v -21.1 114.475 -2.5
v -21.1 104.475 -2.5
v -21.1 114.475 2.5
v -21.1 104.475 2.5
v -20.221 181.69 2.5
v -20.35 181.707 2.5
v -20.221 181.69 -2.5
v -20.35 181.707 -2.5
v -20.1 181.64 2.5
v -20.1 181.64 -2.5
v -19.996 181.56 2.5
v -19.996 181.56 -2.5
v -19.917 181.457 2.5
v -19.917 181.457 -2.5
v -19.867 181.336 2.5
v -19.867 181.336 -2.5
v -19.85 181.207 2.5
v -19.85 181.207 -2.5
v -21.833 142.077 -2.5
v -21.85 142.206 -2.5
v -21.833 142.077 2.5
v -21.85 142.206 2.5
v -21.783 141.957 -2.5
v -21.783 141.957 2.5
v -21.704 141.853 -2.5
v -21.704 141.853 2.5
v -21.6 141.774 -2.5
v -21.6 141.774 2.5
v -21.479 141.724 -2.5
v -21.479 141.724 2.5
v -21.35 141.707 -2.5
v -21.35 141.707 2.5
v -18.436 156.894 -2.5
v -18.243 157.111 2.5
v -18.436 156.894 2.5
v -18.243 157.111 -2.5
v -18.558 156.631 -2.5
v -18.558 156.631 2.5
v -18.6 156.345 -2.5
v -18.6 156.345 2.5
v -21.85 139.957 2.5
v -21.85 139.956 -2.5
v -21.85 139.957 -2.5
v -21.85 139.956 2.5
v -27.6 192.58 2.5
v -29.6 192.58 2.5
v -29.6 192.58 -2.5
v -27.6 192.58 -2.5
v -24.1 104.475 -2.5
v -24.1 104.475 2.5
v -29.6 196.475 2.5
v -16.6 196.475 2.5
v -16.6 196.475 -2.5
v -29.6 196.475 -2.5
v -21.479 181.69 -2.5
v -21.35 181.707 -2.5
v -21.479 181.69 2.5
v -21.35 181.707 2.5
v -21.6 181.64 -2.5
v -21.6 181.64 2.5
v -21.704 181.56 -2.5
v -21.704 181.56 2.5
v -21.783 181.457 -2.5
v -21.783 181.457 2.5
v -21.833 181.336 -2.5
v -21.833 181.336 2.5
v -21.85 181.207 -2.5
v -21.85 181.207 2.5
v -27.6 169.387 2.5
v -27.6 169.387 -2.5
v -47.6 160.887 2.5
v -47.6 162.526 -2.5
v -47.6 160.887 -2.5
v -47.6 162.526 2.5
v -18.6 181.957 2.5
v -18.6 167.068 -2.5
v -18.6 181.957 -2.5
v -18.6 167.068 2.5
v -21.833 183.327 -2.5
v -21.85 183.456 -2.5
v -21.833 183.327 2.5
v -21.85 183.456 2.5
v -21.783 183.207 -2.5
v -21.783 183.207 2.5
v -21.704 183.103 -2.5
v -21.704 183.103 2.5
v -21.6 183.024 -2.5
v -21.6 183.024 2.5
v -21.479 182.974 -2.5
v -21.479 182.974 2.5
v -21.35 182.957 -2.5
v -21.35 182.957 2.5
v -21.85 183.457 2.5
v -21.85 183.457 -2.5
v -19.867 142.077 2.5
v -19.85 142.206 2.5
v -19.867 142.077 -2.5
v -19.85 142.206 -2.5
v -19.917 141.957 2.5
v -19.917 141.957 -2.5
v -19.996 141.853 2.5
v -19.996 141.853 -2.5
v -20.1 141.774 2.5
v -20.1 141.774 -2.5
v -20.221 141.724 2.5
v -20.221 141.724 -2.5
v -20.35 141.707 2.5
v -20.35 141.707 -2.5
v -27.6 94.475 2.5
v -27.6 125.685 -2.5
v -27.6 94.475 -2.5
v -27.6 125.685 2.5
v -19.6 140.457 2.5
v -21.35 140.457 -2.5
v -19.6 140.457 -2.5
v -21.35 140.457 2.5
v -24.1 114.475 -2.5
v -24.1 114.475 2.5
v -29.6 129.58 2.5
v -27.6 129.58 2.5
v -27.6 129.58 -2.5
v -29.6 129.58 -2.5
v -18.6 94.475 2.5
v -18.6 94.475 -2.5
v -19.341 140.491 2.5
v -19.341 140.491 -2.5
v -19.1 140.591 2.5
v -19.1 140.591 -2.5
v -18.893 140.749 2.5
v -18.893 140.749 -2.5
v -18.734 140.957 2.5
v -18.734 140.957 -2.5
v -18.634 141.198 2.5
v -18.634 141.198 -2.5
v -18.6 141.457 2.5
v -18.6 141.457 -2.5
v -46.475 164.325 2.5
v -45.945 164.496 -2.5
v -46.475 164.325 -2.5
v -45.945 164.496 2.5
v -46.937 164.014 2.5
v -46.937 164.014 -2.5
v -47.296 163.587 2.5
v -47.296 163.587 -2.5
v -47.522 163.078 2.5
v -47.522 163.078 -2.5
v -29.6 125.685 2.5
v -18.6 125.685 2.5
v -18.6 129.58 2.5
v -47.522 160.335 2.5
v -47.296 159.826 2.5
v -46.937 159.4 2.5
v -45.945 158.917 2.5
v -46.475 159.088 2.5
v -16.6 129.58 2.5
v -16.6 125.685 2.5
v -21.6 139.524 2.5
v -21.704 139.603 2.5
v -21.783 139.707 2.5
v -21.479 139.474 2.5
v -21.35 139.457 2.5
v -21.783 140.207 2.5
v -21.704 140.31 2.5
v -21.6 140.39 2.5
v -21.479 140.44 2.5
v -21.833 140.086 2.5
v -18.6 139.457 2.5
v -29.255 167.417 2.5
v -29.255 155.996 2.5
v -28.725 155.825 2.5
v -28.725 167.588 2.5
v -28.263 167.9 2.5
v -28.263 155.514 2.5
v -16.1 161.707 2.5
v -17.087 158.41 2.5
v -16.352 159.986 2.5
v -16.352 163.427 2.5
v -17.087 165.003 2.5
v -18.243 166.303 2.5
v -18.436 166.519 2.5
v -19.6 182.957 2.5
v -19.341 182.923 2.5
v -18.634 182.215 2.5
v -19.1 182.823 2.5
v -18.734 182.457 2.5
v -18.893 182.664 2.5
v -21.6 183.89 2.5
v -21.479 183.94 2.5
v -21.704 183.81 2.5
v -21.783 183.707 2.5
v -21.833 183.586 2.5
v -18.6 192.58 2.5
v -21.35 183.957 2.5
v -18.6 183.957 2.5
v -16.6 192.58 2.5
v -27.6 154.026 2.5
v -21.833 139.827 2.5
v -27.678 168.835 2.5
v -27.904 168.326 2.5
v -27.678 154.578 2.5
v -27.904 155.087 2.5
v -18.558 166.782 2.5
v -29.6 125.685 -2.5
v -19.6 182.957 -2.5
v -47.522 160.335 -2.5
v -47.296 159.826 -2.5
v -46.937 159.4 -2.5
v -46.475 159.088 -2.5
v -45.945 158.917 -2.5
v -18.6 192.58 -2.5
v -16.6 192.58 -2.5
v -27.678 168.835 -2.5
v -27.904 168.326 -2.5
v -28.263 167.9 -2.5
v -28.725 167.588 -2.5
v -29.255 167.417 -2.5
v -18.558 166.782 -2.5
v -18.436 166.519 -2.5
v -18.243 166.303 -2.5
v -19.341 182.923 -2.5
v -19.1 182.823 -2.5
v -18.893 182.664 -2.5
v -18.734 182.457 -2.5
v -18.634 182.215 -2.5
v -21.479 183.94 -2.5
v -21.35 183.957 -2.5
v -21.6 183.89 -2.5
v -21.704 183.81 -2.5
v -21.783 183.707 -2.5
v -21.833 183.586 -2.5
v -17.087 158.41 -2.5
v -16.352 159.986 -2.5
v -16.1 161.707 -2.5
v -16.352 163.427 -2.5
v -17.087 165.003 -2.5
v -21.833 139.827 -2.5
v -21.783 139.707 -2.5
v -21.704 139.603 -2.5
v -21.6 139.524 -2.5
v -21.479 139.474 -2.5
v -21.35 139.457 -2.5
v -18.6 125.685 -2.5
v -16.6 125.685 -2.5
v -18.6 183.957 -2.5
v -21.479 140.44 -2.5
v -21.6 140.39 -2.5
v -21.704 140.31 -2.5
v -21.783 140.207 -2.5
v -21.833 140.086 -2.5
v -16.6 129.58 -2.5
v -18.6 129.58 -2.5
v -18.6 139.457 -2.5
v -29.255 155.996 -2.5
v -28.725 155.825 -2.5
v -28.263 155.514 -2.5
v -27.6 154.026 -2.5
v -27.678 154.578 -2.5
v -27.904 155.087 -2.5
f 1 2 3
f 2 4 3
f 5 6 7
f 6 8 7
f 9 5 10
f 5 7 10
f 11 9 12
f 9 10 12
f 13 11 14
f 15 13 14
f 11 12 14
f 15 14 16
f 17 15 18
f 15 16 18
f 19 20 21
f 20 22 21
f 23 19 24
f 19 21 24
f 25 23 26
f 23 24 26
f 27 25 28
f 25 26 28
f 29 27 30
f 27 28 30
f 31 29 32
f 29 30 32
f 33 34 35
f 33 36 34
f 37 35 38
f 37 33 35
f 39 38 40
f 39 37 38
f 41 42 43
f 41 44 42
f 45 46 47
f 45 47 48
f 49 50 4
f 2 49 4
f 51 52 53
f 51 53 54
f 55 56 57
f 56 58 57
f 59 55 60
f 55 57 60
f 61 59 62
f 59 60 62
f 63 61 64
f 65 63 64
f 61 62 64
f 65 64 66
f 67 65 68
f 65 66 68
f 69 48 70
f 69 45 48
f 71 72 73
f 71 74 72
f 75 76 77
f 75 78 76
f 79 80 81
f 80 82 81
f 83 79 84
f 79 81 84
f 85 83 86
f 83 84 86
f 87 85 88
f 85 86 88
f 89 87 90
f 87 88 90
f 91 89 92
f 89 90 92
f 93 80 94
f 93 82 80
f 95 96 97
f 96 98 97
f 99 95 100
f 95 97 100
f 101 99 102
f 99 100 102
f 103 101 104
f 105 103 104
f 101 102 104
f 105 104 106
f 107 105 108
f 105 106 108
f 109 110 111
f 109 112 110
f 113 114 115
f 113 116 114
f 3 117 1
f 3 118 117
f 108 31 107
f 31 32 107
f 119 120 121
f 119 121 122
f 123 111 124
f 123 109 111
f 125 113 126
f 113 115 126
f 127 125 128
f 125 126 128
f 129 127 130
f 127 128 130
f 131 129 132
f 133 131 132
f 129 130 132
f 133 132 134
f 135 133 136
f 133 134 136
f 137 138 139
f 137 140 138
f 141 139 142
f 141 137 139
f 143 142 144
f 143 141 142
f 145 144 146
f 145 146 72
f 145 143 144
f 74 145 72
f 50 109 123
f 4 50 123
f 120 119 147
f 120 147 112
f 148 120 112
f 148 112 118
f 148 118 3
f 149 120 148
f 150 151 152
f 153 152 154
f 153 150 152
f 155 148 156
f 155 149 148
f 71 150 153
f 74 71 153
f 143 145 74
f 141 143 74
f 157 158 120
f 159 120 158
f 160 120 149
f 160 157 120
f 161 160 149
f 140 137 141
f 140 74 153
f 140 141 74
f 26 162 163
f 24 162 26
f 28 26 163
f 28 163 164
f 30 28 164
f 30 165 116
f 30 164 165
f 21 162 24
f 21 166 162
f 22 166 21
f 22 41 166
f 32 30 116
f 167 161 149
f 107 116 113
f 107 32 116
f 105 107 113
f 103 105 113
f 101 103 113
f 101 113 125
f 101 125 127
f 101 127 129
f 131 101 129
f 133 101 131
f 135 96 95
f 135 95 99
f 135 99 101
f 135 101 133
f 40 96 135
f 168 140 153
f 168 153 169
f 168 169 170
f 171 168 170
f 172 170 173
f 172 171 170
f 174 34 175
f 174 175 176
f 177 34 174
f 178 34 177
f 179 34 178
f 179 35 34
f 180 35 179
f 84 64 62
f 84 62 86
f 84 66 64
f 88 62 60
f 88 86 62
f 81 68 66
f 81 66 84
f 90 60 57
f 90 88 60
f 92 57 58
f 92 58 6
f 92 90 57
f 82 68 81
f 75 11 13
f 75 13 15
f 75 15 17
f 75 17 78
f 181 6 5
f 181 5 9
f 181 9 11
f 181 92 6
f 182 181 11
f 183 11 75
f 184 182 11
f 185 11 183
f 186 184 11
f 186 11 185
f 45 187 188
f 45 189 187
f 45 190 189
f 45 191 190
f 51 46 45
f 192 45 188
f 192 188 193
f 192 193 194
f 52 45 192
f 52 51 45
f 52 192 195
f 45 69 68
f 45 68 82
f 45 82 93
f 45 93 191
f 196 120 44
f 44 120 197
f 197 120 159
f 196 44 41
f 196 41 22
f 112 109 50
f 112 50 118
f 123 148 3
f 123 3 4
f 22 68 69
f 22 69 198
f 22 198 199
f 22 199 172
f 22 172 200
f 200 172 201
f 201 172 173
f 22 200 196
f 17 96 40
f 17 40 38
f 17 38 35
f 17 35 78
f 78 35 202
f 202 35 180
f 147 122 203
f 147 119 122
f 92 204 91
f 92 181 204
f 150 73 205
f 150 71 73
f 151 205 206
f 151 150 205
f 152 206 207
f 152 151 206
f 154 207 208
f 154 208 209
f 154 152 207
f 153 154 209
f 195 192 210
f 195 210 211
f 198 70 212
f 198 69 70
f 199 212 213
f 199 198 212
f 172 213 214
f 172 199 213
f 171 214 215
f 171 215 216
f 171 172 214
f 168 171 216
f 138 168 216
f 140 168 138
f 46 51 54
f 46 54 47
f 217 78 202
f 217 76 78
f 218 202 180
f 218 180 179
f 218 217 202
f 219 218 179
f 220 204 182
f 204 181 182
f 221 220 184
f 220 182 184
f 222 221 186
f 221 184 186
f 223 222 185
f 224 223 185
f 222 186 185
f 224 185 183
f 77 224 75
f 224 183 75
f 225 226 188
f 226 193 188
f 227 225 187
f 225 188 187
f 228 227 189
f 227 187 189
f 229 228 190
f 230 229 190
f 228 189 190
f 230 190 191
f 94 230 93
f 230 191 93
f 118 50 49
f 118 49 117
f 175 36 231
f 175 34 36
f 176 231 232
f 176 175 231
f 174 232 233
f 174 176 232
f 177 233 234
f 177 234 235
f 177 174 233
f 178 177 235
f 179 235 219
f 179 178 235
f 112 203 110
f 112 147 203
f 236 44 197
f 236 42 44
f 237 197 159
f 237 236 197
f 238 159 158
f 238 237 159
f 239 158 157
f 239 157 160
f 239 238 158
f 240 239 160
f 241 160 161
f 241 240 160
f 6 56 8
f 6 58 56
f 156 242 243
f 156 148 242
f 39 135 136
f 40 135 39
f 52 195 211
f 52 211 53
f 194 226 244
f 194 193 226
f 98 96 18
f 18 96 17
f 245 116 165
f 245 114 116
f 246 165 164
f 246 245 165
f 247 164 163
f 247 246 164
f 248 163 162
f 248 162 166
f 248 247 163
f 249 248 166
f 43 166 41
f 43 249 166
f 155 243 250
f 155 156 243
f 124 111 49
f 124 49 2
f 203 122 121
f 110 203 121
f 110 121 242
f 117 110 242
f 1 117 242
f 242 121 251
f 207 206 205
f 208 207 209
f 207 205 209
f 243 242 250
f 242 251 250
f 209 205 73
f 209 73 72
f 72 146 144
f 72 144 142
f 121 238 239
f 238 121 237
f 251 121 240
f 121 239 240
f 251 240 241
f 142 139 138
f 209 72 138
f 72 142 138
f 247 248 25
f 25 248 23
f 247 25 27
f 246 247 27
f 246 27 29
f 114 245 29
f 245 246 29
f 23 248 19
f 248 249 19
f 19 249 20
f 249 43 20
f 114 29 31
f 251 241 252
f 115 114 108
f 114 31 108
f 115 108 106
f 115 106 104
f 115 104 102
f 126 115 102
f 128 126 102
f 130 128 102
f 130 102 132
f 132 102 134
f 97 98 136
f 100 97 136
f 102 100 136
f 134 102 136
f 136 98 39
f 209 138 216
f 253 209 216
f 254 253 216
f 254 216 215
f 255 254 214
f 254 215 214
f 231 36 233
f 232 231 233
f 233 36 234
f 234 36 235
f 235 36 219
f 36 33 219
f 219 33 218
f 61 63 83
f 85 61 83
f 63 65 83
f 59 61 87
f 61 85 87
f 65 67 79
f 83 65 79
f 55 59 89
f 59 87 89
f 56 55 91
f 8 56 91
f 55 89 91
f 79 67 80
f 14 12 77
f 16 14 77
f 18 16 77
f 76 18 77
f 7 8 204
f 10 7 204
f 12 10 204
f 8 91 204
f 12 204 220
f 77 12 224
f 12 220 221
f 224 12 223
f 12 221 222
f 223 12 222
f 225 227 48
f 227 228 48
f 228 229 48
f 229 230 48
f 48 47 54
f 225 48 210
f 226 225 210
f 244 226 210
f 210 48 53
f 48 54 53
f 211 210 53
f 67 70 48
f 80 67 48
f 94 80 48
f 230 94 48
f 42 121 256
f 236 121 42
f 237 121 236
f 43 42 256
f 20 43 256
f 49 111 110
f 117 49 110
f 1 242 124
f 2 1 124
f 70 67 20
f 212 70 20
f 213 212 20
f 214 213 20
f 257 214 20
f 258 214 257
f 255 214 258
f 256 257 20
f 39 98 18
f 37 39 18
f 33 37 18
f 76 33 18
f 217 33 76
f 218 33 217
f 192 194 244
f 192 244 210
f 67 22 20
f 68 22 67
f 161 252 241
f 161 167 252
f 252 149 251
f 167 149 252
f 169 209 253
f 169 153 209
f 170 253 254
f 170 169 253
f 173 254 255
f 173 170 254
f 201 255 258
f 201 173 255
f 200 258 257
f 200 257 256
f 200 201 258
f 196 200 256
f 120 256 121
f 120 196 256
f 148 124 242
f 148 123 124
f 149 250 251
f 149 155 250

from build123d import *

# Parameters (mm, degrees)
SKETCH1_W           = 2
SKETCH1_H           = 40
SKETCH1_W_2         = 3
SKETCH1_H_2         = 10
BOSS_EXTRUDE1_DEPTH = 2.5
FILLET1_R           = 0.5
FILLET2_R           = 1
FILLET3_R           = 1
FILLET4_R           = 2


with BuildPart() as part:
    # Sketch1 → Boss-Extrude1 (new, symmetric)
    with BuildSketch(Plane.XY):
        with BuildLine():
            Line((-18.6, 166.579989158), (-18.6, 182.956591985))
            Line((-18.6, 182.956591985), (-21.85, 182.956591985))
            Line((-21.85, 182.956591985), (-21.85, 183.956591985))
            Line((-21.85, 183.956591985), (-18.6, 183.956591985))
            Line((-18.6, 183.956591985), (-18.6, 192.579989158))
            Line((-18.6, 192.579989158), (-16.6, 192.579989158))
            Line((-16.6, 192.579989158), (-16.6, 196.474649456))
            Line((-16.6, 196.474649456), (-29.6, 196.474649456))
            Line((-29.6, 196.474649456), (-29.6, 192.579989158))
            Line((-29.6, 192.579989158), (-27.6, 192.579989158))
            Line((-27.6, 192.579989158), (-27.6, 167.706591985))
            Line((-27.6, 167.706591985), (-47.6, 164.206591985))
            Line((-47.6, 164.206591985), (-47.6, 159.206591985))
            Line((-47.6, 159.206591985), (-27.6, 155.706591985))
            Line((-27.6, 155.706591985), (-27.6, 129.579989158))
            Line((-27.6, 129.579989158), (-29.6, 129.579989158))
            Line((-29.6, 129.579989158), (-29.6, 125.685328859))
            Line((-29.6, 125.685328859), (-27.6, 125.685328859))
            Line((-27.6, 125.685328859), (-27.6, 94.474649456))
            Line((-27.6, 94.474649456), (-18.6, 94.474649456))
            Line((-18.6, 94.474649456), (-18.6, 125.685328859))
            Line((-18.6, 125.685328859), (-16.6, 125.685328859))
            Line((-16.6, 125.685328859), (-16.6, 129.579989158))
            Line((-16.6, 129.579989158), (-18.6, 129.579989158))
            Line((-18.6, 129.579989158), (-18.6, 139.456591985))
            Line((-18.6, 139.456591985), (-21.85, 139.456591985))
            Line((-21.85, 139.456591985), (-21.85, 140.456591985))
            Line((-21.85, 140.456591985), (-18.6, 140.456591985))
            Line((-18.6, 140.456591985), (-18.6, 156.833194813))
            ThreePointArc((-18.6, 156.833194813), (-16.1, 161.706591985), (-18.6, 166.579989158))
        make_face()
        with Locations((-20.85, 161.706591985)):
            Rectangle(SKETCH1_W, SKETCH1_H, mode=Mode.SUBTRACT)
        with Locations((-22.6, 109.474649456)):
            Rectangle(SKETCH1_W_2, SKETCH1_H_2, mode=Mode.SUBTRACT)
    extrude(amount=BOSS_EXTRUDE1_DEPTH, both=True)

    # Fillet1
    fillet1_edges = [part.edges().sort_by_distance(p)[0] for p in [
        (-21.85, 183.956591985, 0),
        (-21.85, 182.956591985, 0),
        (-21.85, 140.456591985, 0),
        (-21.85, 139.456591985, 0),
        (-21.85, 181.706591985, 0),
        (-21.85, 141.706591985, 0),
        (-19.85, 141.706591985, 0),
        (-19.85, 181.706591985, 0),
    ]]
    fillet(fillet1_edges, radius=FILLET1_R - 0.0001)  # a hair under: the kernel refuses the full size

    # Fillet2
    fillet2_edges = [part.edges().sort_by_distance(p)[0] for p in [
        (-18.6, 182.956591985, 0),
        (-18.6, 140.456591985, 0),
    ]]
    fillet(fillet2_edges, radius=FILLET2_R)

    # Fillet3
    fillet3_edges = [part.edges().sort_by_distance(p)[0] for p in [
        (-18.6, 166.579989158, 0),
        (-18.6, 156.833194813, 0),
    ]]
    fillet(fillet3_edges, radius=FILLET3_R)

    # Fillet4
    fillet4_edges = [part.edges().sort_by_distance(p)[0] for p in [
        (-27.6, 155.706591985, 0),
        (-47.6, 159.206591985, 0),
        (-47.6, 164.206591985, 0),
        (-27.6, 167.706591985, 0),
    ]]
    fillet(fillet4_edges, radius=FILLET4_R)


solid = part.part
